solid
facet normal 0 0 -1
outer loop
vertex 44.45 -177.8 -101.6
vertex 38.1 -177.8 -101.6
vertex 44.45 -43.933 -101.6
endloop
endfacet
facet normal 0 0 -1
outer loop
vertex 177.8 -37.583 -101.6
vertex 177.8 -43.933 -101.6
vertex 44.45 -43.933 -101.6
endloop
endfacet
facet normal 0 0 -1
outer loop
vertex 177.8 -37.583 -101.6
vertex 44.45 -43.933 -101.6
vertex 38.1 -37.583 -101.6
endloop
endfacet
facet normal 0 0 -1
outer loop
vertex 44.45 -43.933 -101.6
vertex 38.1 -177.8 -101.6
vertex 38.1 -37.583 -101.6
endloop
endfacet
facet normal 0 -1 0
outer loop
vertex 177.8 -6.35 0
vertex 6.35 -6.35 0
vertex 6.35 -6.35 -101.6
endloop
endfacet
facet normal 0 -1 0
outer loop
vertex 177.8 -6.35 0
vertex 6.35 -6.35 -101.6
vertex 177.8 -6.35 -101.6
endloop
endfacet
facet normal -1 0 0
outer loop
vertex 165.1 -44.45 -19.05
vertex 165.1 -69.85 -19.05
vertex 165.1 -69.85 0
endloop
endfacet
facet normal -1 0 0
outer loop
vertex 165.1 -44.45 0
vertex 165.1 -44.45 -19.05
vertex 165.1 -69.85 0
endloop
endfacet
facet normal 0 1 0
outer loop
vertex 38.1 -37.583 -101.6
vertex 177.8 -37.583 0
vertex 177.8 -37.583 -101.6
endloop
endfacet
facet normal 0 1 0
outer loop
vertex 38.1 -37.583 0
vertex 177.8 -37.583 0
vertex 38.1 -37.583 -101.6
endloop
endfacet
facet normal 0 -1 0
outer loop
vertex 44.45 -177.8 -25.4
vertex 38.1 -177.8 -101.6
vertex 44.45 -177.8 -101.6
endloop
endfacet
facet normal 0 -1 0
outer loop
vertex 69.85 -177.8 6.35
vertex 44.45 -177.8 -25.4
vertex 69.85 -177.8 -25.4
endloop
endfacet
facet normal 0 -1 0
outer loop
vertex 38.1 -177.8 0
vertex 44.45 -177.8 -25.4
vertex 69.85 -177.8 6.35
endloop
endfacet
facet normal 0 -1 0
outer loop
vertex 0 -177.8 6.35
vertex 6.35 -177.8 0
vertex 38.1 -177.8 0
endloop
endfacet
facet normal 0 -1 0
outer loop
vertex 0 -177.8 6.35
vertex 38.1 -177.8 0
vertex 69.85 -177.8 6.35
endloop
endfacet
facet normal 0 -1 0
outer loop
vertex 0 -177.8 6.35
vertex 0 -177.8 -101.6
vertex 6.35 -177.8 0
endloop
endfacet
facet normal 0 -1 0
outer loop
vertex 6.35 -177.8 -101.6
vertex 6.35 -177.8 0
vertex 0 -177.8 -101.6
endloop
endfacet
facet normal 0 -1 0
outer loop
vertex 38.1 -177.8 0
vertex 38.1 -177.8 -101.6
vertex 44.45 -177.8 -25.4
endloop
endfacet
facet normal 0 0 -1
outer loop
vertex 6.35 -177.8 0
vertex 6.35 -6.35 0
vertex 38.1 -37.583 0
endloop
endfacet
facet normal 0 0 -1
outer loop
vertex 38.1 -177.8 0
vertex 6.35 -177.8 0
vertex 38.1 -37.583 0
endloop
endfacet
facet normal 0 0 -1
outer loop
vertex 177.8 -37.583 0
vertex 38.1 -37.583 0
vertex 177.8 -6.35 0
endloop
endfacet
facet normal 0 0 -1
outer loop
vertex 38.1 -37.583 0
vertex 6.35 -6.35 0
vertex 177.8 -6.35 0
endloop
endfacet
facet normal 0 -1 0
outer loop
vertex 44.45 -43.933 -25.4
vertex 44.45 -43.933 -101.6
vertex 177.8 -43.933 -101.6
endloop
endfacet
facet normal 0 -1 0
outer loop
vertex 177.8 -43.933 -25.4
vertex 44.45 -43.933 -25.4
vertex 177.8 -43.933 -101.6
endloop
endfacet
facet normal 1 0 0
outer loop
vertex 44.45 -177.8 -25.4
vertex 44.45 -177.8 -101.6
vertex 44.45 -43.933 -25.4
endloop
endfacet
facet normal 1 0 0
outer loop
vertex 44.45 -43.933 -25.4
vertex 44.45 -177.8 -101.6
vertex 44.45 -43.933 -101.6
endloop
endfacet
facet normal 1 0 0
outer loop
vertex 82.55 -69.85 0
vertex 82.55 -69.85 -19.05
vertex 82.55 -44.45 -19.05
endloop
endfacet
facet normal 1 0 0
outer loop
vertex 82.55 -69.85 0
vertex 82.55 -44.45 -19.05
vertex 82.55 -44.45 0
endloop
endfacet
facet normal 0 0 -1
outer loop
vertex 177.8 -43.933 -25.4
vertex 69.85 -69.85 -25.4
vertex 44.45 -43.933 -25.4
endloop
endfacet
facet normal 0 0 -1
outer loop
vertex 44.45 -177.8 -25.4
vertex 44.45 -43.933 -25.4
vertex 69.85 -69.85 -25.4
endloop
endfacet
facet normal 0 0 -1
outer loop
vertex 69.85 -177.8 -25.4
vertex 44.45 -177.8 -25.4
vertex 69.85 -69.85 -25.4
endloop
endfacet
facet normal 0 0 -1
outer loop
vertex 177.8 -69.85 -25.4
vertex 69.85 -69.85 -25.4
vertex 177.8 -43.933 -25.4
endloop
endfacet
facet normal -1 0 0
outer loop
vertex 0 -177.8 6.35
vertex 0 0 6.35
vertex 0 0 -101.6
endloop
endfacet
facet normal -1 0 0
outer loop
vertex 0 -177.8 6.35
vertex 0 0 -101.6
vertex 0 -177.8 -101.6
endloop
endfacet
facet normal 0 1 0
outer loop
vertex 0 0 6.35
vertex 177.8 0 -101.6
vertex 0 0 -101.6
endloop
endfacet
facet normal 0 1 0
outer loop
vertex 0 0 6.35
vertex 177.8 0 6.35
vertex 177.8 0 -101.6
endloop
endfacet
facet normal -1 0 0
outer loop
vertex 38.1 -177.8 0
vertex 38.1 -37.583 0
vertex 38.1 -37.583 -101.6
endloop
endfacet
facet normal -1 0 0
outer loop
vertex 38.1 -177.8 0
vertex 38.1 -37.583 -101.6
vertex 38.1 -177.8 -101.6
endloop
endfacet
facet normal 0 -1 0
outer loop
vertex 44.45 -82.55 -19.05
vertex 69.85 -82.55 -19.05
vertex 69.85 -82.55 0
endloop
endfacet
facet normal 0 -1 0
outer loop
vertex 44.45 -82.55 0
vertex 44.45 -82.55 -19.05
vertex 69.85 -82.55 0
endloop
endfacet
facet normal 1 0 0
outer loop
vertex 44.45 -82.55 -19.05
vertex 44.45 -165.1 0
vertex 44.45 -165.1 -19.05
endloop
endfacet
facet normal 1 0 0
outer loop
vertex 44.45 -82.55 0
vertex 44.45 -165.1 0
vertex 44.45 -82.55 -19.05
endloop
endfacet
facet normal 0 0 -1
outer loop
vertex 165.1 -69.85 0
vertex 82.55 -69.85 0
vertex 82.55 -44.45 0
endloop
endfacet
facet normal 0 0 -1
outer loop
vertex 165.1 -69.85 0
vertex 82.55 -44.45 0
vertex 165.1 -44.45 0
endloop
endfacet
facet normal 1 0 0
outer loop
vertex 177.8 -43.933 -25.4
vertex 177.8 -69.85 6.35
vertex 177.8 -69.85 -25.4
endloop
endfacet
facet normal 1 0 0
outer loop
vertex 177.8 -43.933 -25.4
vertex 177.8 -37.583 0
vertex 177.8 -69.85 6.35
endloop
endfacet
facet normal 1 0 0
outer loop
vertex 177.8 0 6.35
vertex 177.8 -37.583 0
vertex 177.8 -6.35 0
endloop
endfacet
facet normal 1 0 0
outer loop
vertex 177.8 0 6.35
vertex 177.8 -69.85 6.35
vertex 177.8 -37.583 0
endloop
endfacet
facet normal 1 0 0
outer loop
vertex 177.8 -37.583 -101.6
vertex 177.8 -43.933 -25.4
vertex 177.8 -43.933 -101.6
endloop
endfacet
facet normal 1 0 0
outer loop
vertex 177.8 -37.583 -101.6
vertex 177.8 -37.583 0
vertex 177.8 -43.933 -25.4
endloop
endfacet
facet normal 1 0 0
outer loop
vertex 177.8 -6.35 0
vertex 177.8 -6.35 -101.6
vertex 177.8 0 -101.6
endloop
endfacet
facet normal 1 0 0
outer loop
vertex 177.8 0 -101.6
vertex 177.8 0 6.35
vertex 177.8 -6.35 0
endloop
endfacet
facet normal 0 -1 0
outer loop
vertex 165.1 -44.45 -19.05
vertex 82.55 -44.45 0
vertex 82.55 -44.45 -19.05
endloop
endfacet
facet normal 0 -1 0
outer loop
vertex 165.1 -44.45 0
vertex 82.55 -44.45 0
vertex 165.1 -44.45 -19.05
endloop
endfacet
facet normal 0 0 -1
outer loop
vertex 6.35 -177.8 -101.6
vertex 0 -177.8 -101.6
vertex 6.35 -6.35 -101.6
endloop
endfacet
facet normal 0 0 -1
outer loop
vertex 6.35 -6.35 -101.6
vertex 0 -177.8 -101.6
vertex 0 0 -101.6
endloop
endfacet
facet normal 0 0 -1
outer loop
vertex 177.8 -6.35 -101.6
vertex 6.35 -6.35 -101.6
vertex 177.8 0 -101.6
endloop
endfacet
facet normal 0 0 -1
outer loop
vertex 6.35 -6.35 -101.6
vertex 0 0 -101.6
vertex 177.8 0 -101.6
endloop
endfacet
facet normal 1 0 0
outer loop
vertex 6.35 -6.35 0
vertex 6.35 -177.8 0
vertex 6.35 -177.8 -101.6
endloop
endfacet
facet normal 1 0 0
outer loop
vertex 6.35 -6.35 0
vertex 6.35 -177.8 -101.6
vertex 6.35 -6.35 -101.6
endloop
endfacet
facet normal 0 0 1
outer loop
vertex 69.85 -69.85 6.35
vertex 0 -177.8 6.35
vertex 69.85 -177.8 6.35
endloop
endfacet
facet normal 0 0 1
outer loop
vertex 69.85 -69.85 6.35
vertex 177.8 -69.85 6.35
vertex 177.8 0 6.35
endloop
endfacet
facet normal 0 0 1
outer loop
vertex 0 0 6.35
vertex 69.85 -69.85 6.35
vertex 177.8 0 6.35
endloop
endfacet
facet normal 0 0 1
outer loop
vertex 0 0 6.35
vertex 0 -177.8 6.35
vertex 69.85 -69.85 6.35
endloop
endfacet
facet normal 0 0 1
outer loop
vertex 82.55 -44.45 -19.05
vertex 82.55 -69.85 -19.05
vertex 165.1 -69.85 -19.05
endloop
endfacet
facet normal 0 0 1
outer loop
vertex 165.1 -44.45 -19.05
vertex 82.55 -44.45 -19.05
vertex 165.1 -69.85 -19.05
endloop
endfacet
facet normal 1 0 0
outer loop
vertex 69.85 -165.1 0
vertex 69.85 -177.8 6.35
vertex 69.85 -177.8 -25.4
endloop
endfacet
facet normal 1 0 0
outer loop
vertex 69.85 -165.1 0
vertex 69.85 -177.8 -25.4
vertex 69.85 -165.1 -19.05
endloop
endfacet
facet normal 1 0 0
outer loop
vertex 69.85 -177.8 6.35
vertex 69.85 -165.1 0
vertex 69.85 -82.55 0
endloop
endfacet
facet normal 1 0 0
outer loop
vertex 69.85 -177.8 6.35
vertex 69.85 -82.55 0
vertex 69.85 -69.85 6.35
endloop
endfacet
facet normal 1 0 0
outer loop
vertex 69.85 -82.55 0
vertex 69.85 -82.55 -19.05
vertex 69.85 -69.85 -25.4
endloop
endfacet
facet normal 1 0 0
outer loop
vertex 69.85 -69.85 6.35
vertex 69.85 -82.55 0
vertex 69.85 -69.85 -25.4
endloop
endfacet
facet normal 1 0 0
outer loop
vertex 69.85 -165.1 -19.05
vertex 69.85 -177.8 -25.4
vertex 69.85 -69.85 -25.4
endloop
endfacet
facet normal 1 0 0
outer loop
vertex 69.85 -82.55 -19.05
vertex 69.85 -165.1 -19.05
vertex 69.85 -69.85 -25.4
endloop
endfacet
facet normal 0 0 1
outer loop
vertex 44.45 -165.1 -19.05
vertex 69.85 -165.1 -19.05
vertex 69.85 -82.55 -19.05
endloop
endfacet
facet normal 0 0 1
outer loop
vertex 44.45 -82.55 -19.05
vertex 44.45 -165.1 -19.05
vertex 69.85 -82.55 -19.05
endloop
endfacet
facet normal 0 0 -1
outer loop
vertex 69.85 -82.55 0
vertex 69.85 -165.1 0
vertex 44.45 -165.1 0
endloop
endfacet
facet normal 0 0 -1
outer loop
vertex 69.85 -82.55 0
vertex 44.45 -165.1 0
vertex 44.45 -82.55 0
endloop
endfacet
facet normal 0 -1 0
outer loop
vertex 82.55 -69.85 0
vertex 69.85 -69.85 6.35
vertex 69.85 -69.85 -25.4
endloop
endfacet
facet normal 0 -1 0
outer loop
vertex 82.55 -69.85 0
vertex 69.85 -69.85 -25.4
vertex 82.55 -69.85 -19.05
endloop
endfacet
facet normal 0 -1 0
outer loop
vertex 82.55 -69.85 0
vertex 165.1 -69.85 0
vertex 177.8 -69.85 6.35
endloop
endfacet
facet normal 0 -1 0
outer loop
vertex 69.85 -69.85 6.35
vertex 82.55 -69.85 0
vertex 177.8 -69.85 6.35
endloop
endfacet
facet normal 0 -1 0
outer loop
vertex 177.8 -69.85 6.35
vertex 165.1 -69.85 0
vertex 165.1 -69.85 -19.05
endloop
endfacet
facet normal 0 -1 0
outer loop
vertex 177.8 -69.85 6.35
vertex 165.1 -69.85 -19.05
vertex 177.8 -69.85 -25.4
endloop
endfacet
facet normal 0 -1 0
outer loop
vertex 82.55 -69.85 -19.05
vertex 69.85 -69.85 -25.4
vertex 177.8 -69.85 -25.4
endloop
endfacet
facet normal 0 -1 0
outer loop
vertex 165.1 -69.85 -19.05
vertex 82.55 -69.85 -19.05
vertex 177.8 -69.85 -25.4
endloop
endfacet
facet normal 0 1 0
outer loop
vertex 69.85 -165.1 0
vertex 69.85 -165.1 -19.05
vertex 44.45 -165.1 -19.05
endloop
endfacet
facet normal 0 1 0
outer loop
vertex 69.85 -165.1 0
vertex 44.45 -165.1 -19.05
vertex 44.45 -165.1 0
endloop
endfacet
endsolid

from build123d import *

# Parameters (mm, degrees)
F1_DEPTH  = 6.35
F2_DEPTH  = 101.6
F3_DEPTH  = 25.4
F4_DEPTH  = 25.4
F6_DEPTH  = 76.2
F7_W      = 82.55
F7_H      = 19.05
F8_DEPTH  = 25.4
F9_W      = 82.55
F9_H      = 19.05
F10_DEPTH = 25.4


with BuildPart() as f1:
    # F0 (on Top) → F1 (new body)
    with BuildSketch(Plane.XY):
        Polygon((177.8, 0), (0, 0), (0, -177.8), (6.35, -177.8), (6.35, -6.35), (177.8, -6.35), align=None)
        Polygon((6.35, -6.35), (6.35, -177.8), (38.1, -177.8), (38.1, -37.5833287835), (177.8, -37.5833287835), (177.8, -6.35), align=None)
        Polygon((38.1, -37.5833287835), (38.1, -177.8), (44.45, -177.8), (44.45, -44.45), (177.8, -44.45), (177.8, -37.5833287835), align=None)
    extrude(amount=F1_DEPTH)

    # F0 (on Top) → F2 (join)
    with BuildSketch(Plane.XY):
        Polygon((177.8, 0), (0, 0), (0, -177.8), (6.35, -177.8), (6.35, -6.35), (177.8, -6.35), align=None)
        Polygon((38.1, -37.5833287835), (38.1, -177.8), (44.45, -177.8), (44.45, -44.45), (177.8, -44.45), (177.8, -37.5833287835), align=None)
    extrude(amount=-F2_DEPTH)

    # F3 (add): a face of the model
    f3_faces = [f1.faces().sort_by_distance(p)[0] for p in [
        (111.125, -44.45, -47.625),
    ]]
    extrude(f3_faces, amount=F3_DEPTH)

    # F4 (add): a face of the model
    f4_faces = [f1.faces().sort_by_distance(p)[0] for p in [
        (44.45, -123.825, -47.625),
    ]]
    extrude(f4_faces, amount=F4_DEPTH)

    # F5 (on face) → F6 (cut)
    with BuildSketch(Plane(origin=(0, 0, -101.6), x_dir=(1, 0, 0), z_dir=(0, 0, -1))):
        Polygon((69.85, 177.8), (44.45, 177.8), (44.45, 43.9333287835), (177.8, 43.9333287835), (177.8, 69.85), (69.85, 69.85), align=None)
    extrude(amount=-F6_DEPTH, mode=Mode.SUBTRACT)

    # F7 (on face) → F8 (cut)
    with BuildSketch(Plane.YZ.offset(69.85)):
        with Locations((-123.825, -9.525)):
            Rectangle(F7_W, F7_H)
    extrude(amount=-F8_DEPTH, mode=Mode.SUBTRACT)

    # F9 (on face) → F10 (cut)
    with BuildSketch(Plane.XZ.offset(69.85)):
        with Locations((123.825, -9.525)):
            Rectangle(F9_W, F9_H)
    extrude(amount=-F10_DEPTH, mode=Mode.SUBTRACT)


solid = f1.part
